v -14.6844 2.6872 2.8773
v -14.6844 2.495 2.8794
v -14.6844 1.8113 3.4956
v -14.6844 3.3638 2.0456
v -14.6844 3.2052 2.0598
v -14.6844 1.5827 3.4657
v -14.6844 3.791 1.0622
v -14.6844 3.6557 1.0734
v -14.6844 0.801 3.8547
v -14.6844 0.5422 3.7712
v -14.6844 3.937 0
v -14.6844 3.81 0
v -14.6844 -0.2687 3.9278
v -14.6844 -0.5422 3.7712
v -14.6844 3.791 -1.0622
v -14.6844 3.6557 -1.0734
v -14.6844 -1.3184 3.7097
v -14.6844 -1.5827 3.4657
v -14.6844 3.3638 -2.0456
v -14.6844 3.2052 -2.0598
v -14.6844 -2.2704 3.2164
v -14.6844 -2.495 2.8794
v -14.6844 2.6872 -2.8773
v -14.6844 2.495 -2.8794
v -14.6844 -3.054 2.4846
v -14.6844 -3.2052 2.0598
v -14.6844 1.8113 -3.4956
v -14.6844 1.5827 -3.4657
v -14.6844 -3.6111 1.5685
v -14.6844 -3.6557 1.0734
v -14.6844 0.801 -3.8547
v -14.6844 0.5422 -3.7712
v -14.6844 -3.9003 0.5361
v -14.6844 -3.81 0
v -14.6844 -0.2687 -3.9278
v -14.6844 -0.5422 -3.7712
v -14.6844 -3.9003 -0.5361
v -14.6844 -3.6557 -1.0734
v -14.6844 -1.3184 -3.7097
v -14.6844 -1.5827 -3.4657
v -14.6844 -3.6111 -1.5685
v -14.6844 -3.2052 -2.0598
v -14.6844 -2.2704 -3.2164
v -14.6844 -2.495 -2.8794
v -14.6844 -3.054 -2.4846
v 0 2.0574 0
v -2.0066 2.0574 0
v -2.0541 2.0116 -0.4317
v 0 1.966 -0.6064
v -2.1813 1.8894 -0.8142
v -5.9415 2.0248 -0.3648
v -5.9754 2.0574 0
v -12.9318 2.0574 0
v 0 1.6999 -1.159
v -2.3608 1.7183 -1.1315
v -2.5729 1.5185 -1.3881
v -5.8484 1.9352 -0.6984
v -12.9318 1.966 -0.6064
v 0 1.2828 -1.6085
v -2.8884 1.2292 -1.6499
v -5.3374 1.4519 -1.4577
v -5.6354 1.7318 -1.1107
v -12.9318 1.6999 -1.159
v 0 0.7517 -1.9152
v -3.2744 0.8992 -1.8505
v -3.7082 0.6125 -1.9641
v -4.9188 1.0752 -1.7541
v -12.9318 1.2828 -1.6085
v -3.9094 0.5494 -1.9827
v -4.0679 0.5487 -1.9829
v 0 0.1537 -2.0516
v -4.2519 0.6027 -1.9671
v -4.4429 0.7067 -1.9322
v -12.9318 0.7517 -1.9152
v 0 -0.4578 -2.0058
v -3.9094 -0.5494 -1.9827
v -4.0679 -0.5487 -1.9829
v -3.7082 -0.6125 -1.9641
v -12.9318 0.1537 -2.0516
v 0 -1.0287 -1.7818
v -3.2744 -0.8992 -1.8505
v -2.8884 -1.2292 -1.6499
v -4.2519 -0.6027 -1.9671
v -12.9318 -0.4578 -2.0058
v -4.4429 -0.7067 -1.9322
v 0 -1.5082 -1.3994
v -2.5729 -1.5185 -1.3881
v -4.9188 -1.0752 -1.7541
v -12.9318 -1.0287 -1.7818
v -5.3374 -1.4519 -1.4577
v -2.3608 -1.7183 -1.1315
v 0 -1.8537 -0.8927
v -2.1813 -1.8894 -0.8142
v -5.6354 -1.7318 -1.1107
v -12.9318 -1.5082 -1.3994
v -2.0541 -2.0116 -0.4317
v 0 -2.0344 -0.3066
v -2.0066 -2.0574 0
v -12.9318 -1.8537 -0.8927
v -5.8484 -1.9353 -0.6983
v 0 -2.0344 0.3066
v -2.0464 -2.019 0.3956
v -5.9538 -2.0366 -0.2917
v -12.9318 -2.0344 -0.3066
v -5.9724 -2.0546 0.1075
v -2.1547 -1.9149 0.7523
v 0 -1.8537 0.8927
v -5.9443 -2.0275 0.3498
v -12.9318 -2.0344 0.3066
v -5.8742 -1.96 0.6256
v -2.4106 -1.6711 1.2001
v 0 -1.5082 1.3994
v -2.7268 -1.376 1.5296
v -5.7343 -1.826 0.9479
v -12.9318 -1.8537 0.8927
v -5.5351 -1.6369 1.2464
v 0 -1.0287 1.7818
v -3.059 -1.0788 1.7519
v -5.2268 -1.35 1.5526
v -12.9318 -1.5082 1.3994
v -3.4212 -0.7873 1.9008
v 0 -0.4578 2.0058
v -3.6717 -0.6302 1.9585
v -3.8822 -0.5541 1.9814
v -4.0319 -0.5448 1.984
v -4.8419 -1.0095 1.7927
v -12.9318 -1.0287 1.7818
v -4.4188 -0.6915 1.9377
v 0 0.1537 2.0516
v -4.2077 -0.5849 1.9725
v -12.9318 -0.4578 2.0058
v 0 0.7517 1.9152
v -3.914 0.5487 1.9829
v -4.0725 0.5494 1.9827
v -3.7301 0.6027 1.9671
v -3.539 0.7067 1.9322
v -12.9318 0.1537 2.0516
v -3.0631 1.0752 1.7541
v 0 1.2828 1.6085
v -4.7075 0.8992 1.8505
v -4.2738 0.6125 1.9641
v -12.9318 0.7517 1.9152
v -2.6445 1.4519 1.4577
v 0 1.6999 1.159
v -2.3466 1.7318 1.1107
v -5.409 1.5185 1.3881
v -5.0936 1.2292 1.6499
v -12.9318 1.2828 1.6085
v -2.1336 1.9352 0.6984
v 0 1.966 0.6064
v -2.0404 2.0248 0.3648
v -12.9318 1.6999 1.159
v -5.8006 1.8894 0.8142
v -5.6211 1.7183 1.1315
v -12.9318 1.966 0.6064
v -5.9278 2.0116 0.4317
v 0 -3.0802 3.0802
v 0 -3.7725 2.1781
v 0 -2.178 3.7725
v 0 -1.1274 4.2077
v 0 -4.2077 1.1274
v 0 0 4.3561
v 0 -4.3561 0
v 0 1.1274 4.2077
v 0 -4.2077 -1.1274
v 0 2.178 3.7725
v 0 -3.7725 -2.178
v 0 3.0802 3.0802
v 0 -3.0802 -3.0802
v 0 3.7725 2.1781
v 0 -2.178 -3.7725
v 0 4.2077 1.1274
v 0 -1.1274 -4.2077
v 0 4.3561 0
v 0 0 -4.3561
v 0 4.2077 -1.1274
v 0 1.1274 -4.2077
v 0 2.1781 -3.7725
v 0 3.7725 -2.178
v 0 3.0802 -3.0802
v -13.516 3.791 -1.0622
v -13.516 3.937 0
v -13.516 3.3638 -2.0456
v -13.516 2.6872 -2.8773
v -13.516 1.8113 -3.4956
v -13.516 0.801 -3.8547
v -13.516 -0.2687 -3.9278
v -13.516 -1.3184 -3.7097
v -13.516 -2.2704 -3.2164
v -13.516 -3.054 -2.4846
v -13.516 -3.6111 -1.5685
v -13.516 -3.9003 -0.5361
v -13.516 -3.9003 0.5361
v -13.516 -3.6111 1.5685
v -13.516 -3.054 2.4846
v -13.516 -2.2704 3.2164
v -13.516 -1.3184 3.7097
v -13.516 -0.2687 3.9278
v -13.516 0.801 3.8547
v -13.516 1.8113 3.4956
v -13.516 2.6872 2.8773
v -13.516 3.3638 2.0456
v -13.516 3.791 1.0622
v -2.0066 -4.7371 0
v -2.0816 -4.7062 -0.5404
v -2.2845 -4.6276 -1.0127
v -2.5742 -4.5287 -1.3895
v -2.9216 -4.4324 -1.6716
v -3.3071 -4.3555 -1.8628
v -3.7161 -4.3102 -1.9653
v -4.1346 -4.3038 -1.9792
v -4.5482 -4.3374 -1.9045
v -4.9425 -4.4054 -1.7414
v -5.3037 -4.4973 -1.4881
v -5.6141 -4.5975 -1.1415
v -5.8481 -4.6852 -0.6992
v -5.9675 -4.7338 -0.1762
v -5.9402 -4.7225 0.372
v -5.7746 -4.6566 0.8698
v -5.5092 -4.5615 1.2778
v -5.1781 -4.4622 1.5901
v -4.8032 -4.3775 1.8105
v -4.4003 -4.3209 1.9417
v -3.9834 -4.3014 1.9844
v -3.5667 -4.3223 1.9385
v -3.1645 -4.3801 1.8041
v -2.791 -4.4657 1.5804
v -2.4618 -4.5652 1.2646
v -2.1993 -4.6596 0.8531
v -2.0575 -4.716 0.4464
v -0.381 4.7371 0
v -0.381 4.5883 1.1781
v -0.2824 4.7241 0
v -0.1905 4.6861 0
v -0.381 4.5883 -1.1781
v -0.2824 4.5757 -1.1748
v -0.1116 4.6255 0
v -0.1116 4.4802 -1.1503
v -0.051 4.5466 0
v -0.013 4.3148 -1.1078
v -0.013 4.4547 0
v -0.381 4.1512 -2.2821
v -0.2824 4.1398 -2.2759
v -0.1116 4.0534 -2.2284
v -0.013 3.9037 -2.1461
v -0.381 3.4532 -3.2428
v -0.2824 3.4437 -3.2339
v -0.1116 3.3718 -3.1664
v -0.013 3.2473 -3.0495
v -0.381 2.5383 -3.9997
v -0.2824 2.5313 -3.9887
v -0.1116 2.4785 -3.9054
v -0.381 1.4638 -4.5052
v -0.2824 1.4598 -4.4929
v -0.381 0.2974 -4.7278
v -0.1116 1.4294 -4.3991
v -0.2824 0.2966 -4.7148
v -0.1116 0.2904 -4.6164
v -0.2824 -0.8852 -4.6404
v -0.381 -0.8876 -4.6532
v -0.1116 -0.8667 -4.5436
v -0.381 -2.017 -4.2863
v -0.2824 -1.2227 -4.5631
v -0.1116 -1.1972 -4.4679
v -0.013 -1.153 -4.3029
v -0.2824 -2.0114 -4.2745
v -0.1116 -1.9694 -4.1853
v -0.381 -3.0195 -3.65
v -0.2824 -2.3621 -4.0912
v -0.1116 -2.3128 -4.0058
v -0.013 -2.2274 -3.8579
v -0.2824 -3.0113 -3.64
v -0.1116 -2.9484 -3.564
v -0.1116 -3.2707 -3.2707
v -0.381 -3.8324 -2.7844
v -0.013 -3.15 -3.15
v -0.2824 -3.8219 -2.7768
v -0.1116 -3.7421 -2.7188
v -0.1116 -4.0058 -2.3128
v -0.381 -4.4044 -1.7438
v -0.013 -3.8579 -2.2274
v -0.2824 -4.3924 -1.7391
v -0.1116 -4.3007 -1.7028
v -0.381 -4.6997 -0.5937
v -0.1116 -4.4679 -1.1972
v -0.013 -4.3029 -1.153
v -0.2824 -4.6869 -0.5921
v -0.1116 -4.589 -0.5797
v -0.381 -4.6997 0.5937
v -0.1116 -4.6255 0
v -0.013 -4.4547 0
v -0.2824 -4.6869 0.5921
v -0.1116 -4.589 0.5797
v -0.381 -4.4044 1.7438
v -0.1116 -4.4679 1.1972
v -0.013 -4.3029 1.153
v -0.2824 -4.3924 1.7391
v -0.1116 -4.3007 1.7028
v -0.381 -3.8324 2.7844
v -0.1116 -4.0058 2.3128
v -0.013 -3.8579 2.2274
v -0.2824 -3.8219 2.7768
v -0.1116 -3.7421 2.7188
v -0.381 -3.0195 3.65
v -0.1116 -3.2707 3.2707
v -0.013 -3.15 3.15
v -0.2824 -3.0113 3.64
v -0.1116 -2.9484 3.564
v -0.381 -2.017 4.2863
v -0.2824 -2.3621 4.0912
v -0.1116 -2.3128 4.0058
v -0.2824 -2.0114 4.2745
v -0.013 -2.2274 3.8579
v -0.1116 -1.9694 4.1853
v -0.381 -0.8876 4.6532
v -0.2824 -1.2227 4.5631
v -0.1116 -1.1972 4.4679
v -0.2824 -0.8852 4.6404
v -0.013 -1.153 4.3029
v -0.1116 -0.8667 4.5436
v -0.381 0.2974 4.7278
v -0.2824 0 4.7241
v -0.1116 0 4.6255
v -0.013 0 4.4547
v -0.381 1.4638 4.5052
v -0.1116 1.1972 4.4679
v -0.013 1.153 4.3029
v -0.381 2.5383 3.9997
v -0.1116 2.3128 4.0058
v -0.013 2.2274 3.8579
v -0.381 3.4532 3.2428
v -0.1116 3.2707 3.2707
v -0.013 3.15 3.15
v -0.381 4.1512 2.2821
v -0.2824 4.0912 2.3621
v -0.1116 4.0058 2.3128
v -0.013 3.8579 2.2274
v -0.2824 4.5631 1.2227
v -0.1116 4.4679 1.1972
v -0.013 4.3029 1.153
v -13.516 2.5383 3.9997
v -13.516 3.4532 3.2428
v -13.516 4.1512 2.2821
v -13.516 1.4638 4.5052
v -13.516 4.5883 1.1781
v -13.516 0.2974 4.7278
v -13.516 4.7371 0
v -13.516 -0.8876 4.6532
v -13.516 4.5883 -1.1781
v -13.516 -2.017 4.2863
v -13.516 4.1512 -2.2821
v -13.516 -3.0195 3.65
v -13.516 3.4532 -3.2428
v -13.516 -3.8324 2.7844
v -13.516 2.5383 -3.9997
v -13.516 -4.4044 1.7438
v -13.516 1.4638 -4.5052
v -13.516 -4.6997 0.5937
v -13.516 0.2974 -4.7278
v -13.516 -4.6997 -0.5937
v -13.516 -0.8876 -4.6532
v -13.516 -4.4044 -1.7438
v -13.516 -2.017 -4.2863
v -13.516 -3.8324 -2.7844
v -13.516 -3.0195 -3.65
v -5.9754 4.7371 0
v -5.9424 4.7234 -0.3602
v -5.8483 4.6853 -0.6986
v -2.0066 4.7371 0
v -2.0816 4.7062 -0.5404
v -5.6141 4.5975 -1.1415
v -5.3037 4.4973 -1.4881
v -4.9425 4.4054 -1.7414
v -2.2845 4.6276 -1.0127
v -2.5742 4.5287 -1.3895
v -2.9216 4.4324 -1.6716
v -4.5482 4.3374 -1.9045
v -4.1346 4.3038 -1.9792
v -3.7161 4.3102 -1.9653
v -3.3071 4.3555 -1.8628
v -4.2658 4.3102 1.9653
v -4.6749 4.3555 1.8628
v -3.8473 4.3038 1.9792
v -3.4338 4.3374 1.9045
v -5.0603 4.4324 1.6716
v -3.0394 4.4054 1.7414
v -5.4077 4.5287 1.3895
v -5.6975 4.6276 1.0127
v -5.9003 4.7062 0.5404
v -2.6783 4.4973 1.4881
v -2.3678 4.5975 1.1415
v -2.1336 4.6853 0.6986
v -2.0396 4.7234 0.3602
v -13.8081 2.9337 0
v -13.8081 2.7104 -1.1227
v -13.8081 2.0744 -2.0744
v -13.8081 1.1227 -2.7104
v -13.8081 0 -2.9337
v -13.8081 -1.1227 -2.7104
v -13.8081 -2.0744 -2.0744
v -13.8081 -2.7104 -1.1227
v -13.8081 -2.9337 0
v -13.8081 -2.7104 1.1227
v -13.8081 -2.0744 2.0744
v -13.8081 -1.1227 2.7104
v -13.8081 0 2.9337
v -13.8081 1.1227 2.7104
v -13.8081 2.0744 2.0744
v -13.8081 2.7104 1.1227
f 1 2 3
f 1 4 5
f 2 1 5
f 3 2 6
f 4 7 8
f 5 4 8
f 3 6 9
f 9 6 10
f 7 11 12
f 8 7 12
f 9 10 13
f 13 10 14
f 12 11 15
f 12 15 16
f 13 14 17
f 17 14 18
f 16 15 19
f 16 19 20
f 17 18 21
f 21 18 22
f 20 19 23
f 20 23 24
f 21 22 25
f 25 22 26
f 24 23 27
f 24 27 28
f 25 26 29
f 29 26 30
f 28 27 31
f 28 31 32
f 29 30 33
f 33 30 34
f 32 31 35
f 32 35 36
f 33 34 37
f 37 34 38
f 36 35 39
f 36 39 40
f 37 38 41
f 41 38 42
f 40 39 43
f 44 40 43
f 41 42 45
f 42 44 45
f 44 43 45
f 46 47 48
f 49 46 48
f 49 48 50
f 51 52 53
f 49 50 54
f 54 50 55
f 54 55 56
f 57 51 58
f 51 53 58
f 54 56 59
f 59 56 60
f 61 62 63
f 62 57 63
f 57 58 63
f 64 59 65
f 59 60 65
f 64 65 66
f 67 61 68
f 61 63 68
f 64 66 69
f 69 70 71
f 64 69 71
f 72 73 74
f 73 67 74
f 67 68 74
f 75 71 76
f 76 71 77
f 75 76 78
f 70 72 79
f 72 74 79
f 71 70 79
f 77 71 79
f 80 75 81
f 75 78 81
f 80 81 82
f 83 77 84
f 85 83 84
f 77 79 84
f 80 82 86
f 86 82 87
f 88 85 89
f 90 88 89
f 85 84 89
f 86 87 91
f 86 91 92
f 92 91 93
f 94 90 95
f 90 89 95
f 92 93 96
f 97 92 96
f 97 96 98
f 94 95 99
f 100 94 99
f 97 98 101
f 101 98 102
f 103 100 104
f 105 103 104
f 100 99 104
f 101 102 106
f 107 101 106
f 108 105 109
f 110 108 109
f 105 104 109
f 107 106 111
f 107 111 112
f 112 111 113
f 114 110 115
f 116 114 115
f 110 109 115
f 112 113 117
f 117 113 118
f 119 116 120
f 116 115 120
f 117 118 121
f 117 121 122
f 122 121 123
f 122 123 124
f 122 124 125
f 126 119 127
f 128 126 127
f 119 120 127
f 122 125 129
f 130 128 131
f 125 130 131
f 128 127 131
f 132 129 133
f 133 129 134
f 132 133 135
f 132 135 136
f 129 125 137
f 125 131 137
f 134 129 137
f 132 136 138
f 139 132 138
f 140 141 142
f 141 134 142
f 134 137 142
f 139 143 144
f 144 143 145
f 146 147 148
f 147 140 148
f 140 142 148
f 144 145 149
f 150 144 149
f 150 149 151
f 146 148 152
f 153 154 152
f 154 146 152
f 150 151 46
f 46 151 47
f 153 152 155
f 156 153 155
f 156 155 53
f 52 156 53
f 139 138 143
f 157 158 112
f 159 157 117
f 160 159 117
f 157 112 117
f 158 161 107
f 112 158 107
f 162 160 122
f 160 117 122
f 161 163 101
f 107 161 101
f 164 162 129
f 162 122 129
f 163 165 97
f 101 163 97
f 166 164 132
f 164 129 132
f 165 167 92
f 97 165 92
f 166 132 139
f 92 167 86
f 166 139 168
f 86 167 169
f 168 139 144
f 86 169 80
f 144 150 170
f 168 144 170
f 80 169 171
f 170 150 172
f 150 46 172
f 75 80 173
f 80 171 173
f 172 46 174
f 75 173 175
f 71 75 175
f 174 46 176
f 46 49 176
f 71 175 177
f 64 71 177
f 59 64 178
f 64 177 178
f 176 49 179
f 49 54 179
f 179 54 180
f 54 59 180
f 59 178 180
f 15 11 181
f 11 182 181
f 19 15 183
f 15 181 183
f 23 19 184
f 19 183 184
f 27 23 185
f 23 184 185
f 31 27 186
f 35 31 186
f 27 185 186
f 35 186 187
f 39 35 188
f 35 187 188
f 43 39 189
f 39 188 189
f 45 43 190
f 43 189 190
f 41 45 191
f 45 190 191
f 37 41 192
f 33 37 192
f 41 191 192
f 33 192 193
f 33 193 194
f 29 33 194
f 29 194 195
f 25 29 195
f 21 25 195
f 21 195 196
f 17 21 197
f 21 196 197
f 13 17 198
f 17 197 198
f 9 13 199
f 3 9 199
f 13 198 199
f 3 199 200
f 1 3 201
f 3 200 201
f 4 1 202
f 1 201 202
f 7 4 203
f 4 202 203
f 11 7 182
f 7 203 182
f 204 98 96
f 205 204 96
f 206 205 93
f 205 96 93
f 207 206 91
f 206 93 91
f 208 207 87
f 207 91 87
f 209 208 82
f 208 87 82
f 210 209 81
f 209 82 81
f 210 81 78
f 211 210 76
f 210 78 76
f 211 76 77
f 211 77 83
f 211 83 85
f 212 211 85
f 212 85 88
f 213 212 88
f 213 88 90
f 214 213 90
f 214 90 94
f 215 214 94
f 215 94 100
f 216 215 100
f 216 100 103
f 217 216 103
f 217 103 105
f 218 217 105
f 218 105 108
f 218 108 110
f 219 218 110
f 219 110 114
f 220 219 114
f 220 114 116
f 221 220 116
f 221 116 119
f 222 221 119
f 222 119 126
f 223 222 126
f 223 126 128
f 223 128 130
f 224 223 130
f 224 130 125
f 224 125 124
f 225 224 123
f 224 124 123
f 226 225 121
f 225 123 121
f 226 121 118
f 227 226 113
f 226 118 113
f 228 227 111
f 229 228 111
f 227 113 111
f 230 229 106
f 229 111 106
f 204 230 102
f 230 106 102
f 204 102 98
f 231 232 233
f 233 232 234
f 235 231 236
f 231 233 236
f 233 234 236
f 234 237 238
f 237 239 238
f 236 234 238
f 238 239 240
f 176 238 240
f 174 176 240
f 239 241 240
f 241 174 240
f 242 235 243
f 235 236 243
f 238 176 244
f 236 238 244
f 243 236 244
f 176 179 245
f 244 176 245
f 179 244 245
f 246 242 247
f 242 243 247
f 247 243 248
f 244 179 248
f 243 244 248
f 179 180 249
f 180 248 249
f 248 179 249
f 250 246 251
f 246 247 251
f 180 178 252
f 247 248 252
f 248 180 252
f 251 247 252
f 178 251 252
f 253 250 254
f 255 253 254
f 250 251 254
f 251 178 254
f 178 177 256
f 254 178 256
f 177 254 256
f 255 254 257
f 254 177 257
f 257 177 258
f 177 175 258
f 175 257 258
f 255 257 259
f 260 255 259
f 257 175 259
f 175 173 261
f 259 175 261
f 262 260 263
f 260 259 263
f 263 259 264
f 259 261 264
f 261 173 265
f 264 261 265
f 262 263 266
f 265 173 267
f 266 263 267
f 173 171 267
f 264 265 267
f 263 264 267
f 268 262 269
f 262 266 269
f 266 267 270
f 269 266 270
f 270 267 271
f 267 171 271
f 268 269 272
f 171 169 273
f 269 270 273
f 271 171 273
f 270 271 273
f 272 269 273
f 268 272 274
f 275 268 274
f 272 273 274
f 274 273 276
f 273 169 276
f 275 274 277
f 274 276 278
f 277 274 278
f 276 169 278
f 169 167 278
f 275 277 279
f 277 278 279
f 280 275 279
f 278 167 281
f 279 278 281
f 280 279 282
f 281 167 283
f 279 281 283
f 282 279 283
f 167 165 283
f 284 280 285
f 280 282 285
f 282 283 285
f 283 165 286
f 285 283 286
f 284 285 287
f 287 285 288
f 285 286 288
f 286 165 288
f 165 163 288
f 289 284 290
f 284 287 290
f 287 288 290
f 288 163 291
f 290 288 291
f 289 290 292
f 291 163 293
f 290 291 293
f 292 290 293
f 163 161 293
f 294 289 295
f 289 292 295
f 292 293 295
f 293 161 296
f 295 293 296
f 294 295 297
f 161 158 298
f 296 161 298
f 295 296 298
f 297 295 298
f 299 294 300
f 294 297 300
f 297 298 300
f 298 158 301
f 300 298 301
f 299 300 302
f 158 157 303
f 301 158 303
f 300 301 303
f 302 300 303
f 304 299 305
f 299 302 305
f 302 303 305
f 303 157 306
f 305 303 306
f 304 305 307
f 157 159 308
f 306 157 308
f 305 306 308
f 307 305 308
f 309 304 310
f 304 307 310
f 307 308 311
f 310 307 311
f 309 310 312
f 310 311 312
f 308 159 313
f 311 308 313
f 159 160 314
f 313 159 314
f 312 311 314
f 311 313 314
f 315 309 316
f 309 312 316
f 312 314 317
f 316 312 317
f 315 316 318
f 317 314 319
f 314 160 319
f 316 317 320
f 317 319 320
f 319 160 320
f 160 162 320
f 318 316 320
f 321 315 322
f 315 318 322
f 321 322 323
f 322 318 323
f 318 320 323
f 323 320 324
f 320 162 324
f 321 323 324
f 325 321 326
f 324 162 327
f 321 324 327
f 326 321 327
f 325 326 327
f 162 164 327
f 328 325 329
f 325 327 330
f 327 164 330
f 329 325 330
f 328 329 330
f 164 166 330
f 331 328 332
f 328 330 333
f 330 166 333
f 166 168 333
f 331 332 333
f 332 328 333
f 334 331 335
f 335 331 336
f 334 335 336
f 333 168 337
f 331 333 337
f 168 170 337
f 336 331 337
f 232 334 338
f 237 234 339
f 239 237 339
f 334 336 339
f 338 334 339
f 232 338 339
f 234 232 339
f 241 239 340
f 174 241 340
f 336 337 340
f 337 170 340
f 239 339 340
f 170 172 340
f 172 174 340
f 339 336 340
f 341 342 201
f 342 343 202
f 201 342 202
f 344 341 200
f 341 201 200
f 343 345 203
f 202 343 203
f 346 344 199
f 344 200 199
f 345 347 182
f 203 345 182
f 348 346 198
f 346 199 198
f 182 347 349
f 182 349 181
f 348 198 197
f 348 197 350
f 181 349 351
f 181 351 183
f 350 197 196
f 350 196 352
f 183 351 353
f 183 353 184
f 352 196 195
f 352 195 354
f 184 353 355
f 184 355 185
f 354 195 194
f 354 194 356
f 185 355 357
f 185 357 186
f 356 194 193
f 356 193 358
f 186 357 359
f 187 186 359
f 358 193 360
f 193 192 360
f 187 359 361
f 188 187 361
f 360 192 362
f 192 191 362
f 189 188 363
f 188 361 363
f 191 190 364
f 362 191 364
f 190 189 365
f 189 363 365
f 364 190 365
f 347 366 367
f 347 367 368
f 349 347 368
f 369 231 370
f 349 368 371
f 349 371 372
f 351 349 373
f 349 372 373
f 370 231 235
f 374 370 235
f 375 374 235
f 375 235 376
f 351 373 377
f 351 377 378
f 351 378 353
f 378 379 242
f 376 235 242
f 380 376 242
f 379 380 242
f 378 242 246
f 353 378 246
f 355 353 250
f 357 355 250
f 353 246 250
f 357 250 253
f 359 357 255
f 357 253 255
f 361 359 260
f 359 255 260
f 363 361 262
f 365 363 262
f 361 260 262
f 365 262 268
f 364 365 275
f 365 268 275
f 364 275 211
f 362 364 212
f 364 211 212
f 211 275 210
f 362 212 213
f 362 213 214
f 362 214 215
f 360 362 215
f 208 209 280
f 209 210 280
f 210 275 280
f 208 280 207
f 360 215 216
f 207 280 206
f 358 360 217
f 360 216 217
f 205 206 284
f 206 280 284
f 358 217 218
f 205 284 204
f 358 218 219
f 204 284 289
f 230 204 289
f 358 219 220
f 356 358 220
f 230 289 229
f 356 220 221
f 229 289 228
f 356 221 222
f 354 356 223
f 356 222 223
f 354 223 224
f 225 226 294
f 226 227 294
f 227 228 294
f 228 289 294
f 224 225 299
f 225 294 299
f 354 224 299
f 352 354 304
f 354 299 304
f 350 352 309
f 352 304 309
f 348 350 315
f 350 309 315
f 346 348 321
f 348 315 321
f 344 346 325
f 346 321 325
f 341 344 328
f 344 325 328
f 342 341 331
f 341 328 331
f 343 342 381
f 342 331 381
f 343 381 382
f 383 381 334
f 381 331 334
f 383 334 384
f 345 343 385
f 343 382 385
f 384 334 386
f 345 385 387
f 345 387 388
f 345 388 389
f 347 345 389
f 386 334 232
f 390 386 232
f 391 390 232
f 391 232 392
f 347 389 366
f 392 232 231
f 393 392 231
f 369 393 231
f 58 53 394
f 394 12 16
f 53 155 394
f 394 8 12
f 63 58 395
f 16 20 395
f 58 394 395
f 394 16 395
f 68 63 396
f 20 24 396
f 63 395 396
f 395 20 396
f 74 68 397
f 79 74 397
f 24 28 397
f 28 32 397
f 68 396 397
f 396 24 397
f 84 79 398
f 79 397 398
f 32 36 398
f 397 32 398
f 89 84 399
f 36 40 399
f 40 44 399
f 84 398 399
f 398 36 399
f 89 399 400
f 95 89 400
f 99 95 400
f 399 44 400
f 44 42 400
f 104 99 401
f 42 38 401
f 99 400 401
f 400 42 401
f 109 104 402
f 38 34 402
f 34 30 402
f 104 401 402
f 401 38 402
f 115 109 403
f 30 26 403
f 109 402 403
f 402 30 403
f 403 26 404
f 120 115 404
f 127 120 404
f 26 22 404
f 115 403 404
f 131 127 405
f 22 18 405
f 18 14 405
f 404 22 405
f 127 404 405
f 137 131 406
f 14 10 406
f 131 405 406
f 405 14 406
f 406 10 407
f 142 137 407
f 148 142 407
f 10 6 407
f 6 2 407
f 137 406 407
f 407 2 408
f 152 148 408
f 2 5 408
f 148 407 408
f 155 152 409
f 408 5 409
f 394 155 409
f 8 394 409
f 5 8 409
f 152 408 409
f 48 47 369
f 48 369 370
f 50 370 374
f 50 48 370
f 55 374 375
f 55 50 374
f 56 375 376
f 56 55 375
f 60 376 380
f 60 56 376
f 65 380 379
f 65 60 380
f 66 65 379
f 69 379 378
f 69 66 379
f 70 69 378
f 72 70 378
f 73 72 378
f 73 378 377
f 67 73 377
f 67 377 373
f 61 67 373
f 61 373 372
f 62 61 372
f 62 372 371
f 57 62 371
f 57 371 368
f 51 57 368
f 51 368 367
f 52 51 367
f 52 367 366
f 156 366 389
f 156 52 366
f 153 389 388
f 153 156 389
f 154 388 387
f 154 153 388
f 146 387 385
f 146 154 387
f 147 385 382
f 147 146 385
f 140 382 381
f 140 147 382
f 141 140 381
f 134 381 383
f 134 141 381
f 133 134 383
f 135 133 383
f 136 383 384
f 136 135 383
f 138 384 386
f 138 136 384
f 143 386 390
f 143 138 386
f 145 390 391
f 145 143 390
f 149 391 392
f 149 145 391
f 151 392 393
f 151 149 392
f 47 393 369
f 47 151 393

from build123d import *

# Parameters (mm, degrees)
SKETCH2_R               = 1.984375
CUT_EXTRUDE1_DEPTH      = 5.7371001
CUT_EXTRUDE1_DEPTH_BACK = 5.7371001


with BuildPart() as part:
    # Sketch1 → Revolve1 (revolve)
    with BuildSketch(Plane.XY):
        with BuildLine():
            Line((0, 2.0574), (-12.931775, 2.0574))
            Line((-12.931775, 2.0574), (-14.684375, 3.81))
            Line((-14.684375, 3.81), (-14.684375, 3.937))
            Line((-14.684375, 3.937), (-13.515975, 3.937))
            Line((-13.515975, 3.937), (-13.515975, 4.7371))
            Line((-13.515975, 4.7371), (-0.381, 4.7371))
            ThreePointArc((-0.381, 4.7371), (-0.111592316, 4.625507684), (0, 4.3561))
            Line((0, 4.3561), (0, 2.0574))
        make_face()
    revolve(axis=Axis((0, 0, 0), (-1, 0, 0)))

    # Sketch2 → Cut-Extrude1 (cut, two sides)
    with BuildSketch(Plane(origin=(0, 0, 0), x_dir=(1, 0, 0), z_dir=(0, 1, 0))) as cut_extrude1_sk:
        with Locations((-3.990975, 0)):
            Circle(SKETCH2_R)
    extrude(amount=CUT_EXTRUDE1_DEPTH, mode=Mode.SUBTRACT)
    extrude(cut_extrude1_sk.sketch, amount=-CUT_EXTRUDE1_DEPTH_BACK, mode=Mode.SUBTRACT)


solid = part.part
